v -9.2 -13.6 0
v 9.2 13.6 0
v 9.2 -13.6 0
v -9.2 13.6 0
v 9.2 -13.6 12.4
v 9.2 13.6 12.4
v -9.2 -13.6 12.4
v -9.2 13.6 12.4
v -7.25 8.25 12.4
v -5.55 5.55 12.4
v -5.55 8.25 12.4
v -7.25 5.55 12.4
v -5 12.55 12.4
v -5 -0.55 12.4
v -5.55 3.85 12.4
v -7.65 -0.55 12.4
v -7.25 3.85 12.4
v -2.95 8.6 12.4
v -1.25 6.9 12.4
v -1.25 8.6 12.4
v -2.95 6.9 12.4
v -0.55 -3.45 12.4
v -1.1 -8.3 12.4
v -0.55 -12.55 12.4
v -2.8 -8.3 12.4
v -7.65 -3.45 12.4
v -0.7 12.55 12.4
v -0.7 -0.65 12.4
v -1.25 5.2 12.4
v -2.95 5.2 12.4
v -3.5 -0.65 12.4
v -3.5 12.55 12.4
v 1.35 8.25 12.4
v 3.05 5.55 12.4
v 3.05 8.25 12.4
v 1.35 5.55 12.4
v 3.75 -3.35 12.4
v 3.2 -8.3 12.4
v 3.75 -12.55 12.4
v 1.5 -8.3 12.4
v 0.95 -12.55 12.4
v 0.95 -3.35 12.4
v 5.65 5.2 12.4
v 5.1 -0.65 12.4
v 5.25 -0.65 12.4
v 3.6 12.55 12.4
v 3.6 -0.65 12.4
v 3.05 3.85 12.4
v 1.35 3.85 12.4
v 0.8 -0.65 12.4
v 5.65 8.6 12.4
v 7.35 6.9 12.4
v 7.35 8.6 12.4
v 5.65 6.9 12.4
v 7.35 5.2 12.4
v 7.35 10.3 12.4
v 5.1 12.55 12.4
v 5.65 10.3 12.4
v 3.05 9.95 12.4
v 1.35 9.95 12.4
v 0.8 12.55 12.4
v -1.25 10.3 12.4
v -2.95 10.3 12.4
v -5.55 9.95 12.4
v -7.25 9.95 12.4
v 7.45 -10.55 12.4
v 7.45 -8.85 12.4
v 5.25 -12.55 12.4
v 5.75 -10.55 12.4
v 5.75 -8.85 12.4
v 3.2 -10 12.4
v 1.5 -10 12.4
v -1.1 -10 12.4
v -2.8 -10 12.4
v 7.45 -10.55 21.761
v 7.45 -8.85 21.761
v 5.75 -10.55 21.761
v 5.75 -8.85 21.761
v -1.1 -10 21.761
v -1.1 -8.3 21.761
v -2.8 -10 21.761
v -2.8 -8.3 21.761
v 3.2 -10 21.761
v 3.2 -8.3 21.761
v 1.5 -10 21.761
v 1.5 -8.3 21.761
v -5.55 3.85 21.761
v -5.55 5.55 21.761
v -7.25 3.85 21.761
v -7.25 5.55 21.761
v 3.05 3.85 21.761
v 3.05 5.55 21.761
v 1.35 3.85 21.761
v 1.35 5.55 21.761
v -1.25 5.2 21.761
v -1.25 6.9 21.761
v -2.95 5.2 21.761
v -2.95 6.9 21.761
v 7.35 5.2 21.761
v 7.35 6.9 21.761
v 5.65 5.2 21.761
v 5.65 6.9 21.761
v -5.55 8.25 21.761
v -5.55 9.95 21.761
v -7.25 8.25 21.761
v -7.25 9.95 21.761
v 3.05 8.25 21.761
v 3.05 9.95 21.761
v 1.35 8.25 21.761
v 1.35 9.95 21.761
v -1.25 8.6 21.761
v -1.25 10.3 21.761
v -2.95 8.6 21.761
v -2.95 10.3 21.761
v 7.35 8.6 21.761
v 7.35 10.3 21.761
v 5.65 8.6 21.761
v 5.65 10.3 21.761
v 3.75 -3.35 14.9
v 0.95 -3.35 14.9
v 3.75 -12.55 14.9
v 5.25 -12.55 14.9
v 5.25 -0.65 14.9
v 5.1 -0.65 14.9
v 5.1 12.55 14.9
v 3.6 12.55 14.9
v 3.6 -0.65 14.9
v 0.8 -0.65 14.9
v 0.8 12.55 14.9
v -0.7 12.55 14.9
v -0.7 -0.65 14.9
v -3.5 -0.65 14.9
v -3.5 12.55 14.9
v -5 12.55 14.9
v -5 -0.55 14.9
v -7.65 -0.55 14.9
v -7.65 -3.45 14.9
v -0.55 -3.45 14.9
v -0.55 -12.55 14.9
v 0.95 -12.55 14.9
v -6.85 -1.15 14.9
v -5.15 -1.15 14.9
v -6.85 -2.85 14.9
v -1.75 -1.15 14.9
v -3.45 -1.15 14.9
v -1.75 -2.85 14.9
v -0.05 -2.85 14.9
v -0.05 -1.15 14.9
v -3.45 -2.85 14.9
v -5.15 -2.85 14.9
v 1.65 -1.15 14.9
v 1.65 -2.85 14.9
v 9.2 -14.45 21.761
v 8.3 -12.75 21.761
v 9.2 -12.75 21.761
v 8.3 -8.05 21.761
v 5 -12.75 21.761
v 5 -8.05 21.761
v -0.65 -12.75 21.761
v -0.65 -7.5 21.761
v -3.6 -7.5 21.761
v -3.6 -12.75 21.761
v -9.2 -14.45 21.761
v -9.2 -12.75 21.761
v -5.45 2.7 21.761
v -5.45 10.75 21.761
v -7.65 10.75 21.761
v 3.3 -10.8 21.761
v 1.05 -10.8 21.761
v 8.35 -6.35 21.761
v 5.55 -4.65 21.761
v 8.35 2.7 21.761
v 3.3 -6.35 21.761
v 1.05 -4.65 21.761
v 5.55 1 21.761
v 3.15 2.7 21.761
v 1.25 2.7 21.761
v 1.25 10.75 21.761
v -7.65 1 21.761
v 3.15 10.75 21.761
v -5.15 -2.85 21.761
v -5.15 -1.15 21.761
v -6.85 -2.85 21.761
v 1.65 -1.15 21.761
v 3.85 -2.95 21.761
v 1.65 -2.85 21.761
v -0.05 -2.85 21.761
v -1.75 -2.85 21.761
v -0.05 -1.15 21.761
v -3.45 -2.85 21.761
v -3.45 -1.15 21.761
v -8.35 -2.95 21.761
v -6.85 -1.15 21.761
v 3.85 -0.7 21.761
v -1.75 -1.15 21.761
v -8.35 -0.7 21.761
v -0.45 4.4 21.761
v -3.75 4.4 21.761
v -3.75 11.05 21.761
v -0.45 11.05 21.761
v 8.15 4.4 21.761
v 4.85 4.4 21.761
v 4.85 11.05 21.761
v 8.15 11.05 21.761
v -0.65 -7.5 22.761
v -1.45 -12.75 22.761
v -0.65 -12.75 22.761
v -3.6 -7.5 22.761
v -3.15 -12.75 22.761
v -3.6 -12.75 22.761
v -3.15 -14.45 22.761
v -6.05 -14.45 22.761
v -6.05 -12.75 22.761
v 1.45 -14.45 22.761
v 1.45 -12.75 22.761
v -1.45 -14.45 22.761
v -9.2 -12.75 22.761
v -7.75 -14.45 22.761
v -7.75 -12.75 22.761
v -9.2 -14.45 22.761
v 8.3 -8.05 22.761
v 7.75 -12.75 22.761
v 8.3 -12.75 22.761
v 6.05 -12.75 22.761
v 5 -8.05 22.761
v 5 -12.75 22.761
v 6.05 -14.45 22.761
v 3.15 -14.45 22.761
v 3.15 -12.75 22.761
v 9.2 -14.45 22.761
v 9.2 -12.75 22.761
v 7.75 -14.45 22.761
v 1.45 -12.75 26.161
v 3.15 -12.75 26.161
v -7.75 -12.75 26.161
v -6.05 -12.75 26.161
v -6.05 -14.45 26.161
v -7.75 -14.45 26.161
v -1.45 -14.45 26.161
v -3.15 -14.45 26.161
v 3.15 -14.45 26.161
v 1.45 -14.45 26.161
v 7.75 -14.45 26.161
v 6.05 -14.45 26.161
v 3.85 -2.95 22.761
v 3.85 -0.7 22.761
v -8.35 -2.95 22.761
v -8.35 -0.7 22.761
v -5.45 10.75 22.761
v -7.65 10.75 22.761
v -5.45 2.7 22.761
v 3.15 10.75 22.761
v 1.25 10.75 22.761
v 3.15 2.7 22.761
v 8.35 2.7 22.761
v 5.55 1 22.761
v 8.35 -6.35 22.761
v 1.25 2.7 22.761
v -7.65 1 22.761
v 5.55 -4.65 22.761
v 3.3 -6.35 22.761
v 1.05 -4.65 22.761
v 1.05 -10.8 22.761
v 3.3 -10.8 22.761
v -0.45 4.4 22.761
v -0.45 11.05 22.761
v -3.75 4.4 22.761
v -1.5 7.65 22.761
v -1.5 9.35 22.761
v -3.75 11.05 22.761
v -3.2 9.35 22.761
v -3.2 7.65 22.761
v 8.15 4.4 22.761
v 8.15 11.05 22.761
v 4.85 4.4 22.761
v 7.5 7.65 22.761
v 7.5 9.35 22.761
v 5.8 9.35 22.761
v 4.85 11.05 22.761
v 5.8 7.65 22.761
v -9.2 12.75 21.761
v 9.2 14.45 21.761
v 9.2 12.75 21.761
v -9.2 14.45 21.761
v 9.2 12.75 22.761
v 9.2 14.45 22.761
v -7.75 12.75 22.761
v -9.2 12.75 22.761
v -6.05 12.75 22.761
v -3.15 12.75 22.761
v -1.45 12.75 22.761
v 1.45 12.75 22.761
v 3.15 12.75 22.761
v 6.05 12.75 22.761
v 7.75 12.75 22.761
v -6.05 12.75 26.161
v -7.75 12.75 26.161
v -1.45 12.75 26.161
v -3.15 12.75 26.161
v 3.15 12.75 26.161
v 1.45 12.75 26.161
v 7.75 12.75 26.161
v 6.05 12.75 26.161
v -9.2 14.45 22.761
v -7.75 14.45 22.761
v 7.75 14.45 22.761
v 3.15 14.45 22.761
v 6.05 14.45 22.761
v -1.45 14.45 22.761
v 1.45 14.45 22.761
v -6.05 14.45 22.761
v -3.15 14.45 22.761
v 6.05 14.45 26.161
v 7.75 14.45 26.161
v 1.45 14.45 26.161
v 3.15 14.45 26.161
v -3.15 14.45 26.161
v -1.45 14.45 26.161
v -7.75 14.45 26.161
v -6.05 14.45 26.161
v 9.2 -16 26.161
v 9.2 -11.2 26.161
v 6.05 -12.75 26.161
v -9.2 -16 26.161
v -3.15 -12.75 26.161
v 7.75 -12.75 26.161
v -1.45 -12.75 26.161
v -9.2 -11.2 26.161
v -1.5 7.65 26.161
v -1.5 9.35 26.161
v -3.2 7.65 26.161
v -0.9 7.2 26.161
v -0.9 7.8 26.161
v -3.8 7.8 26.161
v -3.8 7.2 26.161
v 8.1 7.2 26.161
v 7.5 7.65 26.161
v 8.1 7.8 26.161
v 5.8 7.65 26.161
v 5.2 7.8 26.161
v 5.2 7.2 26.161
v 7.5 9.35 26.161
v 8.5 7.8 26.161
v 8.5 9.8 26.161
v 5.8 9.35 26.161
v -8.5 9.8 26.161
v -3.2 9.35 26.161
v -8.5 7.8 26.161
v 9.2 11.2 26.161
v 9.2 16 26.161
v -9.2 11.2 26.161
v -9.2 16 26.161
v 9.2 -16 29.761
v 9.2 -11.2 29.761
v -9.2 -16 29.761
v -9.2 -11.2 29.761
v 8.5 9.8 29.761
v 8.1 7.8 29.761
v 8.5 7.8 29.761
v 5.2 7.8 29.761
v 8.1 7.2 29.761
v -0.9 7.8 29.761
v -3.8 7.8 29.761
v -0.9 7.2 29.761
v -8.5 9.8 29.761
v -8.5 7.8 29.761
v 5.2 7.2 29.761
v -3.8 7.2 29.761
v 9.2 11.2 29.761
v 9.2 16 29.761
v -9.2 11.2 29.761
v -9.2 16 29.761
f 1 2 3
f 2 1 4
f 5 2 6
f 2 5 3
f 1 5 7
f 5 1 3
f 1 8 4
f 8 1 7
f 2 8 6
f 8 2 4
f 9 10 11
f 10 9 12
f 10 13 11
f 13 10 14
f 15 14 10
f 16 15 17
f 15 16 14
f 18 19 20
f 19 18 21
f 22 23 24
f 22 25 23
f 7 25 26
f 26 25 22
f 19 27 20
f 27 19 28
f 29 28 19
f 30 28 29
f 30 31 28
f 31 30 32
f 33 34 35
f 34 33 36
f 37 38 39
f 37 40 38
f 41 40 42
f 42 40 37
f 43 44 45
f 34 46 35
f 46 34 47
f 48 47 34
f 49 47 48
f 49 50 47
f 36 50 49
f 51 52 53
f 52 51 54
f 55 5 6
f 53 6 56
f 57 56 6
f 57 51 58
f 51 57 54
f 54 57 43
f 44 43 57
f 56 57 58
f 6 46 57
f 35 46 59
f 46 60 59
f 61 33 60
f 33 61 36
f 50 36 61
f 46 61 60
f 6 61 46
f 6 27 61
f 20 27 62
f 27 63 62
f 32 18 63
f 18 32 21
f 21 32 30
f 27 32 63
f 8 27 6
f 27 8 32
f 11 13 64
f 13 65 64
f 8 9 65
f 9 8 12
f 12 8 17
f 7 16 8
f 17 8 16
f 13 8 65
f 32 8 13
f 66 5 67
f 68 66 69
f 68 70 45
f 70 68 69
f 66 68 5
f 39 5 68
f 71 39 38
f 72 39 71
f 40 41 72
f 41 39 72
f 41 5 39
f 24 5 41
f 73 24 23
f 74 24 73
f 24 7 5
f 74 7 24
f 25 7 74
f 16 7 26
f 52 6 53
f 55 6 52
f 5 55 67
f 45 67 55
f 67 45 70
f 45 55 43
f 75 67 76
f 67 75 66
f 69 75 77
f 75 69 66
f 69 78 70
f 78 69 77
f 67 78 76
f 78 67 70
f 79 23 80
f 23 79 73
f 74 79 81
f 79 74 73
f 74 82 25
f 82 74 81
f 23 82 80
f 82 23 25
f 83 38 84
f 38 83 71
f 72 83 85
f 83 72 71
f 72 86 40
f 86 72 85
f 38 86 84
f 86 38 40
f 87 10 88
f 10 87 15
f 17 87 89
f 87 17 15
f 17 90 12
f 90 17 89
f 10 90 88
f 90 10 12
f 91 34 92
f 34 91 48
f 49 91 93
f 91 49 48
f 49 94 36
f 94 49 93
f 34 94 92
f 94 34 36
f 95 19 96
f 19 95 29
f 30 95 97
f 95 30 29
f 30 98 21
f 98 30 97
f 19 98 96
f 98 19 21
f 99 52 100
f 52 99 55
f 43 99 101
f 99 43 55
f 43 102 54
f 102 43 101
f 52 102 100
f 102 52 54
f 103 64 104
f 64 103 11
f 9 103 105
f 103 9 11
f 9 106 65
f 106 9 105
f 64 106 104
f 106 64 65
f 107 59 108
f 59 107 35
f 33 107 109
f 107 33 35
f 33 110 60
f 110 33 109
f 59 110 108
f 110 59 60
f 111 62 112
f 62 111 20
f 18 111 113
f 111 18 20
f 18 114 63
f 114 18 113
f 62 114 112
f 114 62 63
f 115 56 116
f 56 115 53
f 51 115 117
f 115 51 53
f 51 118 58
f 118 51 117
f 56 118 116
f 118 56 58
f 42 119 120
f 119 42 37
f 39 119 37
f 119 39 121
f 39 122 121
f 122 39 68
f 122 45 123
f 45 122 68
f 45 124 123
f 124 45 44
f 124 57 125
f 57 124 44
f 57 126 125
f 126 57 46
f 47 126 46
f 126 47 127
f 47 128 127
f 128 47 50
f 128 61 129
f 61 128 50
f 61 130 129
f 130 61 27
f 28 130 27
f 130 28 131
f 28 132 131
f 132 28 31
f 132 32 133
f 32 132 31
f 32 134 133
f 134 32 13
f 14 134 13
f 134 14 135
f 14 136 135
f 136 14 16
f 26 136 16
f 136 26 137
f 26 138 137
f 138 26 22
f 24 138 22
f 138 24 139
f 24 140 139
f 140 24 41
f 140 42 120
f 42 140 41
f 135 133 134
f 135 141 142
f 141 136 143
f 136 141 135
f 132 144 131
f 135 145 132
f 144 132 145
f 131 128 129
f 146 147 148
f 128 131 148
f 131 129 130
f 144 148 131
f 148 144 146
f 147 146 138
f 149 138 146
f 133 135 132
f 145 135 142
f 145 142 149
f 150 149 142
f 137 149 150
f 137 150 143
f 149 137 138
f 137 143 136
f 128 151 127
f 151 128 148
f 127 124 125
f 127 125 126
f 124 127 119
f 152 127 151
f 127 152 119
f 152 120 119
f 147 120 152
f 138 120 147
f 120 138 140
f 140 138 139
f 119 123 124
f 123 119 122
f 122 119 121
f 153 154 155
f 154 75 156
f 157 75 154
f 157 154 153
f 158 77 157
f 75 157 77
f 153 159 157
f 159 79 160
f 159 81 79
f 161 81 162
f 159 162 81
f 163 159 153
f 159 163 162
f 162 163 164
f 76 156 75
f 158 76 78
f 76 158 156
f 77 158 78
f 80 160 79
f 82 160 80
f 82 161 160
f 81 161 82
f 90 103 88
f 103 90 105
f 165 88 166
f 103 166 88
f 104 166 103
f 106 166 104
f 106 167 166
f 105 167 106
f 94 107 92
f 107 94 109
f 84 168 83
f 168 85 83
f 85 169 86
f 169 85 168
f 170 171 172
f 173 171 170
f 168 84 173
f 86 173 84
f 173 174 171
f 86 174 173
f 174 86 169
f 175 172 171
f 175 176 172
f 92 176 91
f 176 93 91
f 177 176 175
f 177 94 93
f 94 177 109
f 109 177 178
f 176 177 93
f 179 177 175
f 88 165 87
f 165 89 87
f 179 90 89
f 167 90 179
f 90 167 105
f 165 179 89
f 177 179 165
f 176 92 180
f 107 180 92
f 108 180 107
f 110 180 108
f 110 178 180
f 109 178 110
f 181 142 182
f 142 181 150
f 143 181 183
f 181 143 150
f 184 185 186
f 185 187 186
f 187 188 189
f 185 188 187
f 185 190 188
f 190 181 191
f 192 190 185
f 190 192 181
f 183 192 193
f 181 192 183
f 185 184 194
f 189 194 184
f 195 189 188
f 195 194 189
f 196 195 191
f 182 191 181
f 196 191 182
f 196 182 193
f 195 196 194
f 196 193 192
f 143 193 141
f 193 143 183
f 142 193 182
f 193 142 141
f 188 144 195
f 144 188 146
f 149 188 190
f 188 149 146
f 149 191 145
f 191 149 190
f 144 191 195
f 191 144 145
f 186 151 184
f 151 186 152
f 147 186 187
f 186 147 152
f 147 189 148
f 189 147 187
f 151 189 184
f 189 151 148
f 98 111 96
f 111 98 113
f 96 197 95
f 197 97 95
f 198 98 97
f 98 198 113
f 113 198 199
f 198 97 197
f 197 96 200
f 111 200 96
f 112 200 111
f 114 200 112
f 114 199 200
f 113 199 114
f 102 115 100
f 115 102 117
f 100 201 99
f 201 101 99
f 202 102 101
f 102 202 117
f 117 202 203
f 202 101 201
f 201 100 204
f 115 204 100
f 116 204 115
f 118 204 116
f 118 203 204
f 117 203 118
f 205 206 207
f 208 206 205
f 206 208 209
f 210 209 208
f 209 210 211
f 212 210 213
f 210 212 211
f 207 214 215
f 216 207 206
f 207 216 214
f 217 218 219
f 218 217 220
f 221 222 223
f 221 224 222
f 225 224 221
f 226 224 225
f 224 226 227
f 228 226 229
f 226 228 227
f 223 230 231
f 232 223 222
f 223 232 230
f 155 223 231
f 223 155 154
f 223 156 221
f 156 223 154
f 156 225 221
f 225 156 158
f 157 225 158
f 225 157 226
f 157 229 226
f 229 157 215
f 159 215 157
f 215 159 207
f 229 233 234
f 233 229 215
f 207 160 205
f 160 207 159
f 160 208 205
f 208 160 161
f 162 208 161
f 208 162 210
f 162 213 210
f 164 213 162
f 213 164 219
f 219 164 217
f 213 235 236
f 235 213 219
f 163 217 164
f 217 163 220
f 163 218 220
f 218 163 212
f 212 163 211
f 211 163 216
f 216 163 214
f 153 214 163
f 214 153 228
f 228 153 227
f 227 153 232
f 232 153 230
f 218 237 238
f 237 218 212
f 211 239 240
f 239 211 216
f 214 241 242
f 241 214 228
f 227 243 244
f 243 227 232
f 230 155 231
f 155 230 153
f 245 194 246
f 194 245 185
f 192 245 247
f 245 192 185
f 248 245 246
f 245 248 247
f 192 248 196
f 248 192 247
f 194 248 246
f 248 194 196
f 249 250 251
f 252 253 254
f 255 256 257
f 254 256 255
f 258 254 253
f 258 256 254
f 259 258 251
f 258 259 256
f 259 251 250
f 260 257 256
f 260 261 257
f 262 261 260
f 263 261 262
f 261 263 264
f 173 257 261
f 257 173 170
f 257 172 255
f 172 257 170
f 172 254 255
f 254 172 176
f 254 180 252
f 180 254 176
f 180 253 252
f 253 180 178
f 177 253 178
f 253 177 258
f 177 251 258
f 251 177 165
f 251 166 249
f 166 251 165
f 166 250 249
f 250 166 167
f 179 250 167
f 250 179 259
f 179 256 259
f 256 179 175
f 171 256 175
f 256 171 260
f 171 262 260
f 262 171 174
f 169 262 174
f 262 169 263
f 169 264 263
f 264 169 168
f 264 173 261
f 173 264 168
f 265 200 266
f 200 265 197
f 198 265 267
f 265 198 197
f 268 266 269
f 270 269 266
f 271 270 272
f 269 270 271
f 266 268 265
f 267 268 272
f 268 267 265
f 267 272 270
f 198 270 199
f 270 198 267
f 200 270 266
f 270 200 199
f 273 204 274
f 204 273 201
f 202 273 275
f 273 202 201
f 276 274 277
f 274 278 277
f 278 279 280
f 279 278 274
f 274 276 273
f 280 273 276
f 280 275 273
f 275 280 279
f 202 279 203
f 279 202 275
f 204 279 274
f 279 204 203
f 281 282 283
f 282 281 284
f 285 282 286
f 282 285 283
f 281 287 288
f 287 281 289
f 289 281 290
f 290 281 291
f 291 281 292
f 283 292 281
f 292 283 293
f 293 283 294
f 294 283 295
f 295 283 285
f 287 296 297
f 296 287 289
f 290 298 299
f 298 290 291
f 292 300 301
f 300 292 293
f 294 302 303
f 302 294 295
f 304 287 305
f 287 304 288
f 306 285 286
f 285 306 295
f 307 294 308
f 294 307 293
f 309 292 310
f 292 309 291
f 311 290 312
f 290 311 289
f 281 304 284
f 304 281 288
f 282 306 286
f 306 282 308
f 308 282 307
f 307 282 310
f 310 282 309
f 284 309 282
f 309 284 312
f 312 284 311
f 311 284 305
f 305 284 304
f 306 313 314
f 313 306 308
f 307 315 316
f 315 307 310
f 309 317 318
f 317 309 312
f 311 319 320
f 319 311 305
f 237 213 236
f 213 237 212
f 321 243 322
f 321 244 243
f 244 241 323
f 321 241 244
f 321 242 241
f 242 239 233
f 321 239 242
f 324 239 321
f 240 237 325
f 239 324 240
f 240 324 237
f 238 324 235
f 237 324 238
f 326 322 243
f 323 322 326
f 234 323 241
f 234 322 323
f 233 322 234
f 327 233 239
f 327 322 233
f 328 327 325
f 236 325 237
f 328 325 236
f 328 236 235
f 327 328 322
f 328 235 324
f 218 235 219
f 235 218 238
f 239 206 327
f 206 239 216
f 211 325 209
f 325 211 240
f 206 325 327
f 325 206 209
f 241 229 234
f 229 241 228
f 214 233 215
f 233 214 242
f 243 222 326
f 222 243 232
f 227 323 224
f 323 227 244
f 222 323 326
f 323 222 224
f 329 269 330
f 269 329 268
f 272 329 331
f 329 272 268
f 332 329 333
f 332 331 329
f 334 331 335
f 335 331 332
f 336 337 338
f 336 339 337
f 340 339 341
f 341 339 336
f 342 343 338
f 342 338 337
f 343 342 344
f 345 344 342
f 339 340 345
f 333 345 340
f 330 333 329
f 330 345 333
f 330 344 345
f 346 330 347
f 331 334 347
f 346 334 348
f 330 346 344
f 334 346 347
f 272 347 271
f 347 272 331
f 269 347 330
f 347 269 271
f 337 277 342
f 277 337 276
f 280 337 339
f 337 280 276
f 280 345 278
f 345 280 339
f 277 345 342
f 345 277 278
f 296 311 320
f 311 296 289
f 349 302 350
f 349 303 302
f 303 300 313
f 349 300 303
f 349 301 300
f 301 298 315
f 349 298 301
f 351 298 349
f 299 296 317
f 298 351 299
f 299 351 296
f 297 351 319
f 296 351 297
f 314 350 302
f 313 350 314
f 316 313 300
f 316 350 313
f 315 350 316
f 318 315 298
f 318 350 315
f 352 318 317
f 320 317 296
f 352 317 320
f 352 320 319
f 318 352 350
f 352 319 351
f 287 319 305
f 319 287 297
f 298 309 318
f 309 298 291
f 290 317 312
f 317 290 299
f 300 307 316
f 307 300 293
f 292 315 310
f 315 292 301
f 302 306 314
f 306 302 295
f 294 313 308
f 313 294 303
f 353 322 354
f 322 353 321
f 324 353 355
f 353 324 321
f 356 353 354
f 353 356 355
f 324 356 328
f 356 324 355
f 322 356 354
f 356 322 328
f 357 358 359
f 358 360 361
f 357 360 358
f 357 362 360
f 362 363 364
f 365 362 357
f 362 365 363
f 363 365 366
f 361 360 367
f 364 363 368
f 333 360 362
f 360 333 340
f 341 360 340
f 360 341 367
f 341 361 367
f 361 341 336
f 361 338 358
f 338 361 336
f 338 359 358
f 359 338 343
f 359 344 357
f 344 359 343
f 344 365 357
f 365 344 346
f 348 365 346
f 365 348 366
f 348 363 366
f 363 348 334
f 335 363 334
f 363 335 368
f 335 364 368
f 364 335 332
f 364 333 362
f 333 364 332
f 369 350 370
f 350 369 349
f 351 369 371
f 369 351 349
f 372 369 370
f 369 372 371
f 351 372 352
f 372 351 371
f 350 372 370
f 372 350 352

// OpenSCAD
// Generated by SolidPython 0.4.2 on 2020-09-29 23:21:03
//!OpenSCAD

scale(v = 0.0100000000) {
	translate(v = [-920, -1360, 0]) {
		union() {
			color(c = [0.4000000000, 0.4000000000, 0.4000000000]) {
				translate(v = [0, 0, 0]) {
					linear_extrude(height = 1000.0000000000) {
						polygon(paths = [[0, 1, 2, 3]], points = [[0, 0], [0, 2720], [1840, 2720], [1840, 0]]);
					}
				}
			}
			color(c = [0.2000000000, 0.6000000000, 0.2000000000]) {
				translate(v = [0, 0, 1000.0000000000]) {
					linear_extrude(height = 120.0000000000) {
						polygon(paths = [[0, 1, 2, 3]], points = [[0, 1305], [0, 2720], [1840, 2720], [1840, 1305]]);
					}
				}
			}
			color(c = [0.4000000000, 0.4000000000, 0.4000000000]) {
				translate(v = [0, 0, 1000.0000000000]) {
					linear_extrude(height = 120.0000000000) {
						polygon(paths = [[0, 1, 2, 3]], points = [[0, 0], [0, 1305], [1840, 1305], [1840, 0]]);
					}
				}
			}
			color(c = [0.9000000000, 0.6000000000, 0.6000000000]) {
				translate(v = [0, 0, 1120.0000000000]) {
					linear_extrude(height = 120.0000000000) {
						polygon(paths = [[0, 1, 2, 3]], points = [[155, 1485], [155, 2485], [420, 2485], [420, 1485]]);
					}
				}
			}
			color(c = [0.9000000000, 0.6000000000, 0.6000000000]) {
				translate(v = [0, 0, 1120.0000000000]) {
					linear_extrude(height = 120.0000000000) {
						polygon(paths = [[0, 1, 2, 3]], points = [[570, 1485], [570, 2485], [850, 2485], [850, 1485]]);
					}
				}
			}
			color(c = [0.9000000000, 0.6000000000, 0.6000000000]) {
				translate(v = [0, 0, 1120.0000000000]) {
					linear_extrude(height = 120.0000000000) {
						polygon(paths = [[0, 1, 2, 3]], points = [[1000, 1485], [1000, 2485], [1280, 2485], [1280, 1485]]);
					}
				}
			}
			color(c = [0.9000000000, 0.6000000000, 0.6000000000]) {
				translate(v = [0, 0, 1120.0000000000]) {
					linear_extrude(height = 120.0000000000) {
						polygon(paths = [[0, 1, 2, 3]], points = [[1430, 1485], [1430, 2485], [1695, 2485], [1695, 1485]]);
					}
				}
			}
			color(c = [0.9000000000, 0.6000000000, 0.9000000000]) {
				translate(v = [0, 0, 1120.0000000000]) {
					linear_extrude(height = 120.0000000000) {
						polygon(paths = [[0, 1, 2, 3]], points = [[600, 235], [600, 655], [865, 655], [865, 235]]);
					}
				}
			}
			color(c = [0.9000000000, 0.6000000000, 0.9000000000]) {
				translate(v = [0, 0, 1120.0000000000]) {
					linear_extrude(height = 120.0000000000) {
						polygon(paths = [[0, 1, 2, 3]], points = [[1015, 235], [1015, 655], [1295, 655], [1295, 235]]);
					}
				}
			}
			color(c = [0.9000000000, 0.6000000000, 0.9000000000]) {
				translate(v = [0, 0, 1120.0000000000]) {
					linear_extrude(height = 120.0000000000) {
						polygon(paths = [[0, 1, 2, 3]], points = [[1445, 235], [1445, 655], [1705, 655], [1705, 235]]);
					}
				}
			}
			color(c = [0.2000000000, 0.6000000000, 0.2000000000]) {
				translate(v = [0, 0, 1120.0000000000]) {
					linear_extrude(height = 120.0000000000) {
						difference() {
							polygon(paths = [[0, 1, 2, 3]], points = [[0, 1305], [0, 2720], [1840, 2720], [1840, 1305]]);
							polygon(paths = [[0, 1, 2, 3]], points = [[155, 1485], [420, 1485], [420, 2485], [155, 2485]]);
							polygon(paths = [[0, 1, 2, 3]], points = [[570, 1485], [850, 1485], [850, 2485], [570, 2485]]);
							polygon(paths = [[0, 1, 2, 3]], points = [[1000, 1485], [1280, 1485], [1280, 2485], [1000, 2485]]);
							polygon(paths = [[0, 1, 2, 3]], points = [[1430, 1485], [1695, 1485], [1695, 2485], [1430, 2485]]);
						}
					}
				}
			}
			color(c = [0.4000000000, 0.4000000000, 0.4000000000]) {
				translate(v = [0, 0, 1120.0000000000]) {
					linear_extrude(height = 120.0000000000) {
						difference() {
							polygon(paths = [[0, 1, 2, 3]], points = [[0, 0], [0, 1305], [1840, 1305], [1840, 0]]);
							polygon(paths = [[0, 1, 2, 3]], points = [[600, 235], [865, 235], [865, 655], [600, 655]]);
							polygon(paths = [[0, 1, 2, 3]], points = [[1015, 235], [1295, 235], [1295, 655], [1015, 655]]);
							polygon(paths = [[0, 1, 2, 3]], points = [[1445, 235], [1705, 235], [1705, 655], [1445, 655]]);
						}
					}
				}
			}
			color(c = [0.1000000000, 0.1000000000, 0.1000000000]) {
				translate(v = [0, 0, 1240.0000000000]) {
					linear_extrude(height = 70.0000000000) {
						polygon(paths = [[0, 1, 2, 3]], points = [[1495, 305], [1495, 475], [1665, 475], [1665, 305]]);
					}
				}
			}
			color(c = [0.1000000000, 0.1000000000, 0.1000000000]) {
				translate(v = [0, 0, 1240.0000000000]) {
					linear_extrude(height = 70.0000000000) {
						polygon(paths = [[0, 1, 2, 3]], points = [[640, 360], [640, 530], [810, 530], [810, 360]]);
					}
				}
			}
			color(c = [0.1000000000, 0.1000000000, 0.1000000000]) {
				translate(v = [0, 0, 1240.0000000000]) {
					linear_extrude(height = 70.0000000000) {
						polygon(paths = [[0, 1, 2, 3]], points = [[1070, 360], [1070, 530], [1240, 530], [1240, 360]]);
					}
				}
			}
			color(c = [0.1000000000, 0.1000000000, 0.1000000000]) {
				translate(v = [0, 0, 1240.0000000000]) {
					linear_extrude(height = 70.0000000000) {
						polygon(paths = [[0, 1, 2, 3]], points = [[195, 1745], [195, 1915], [365, 1915], [365, 1745]]);
					}
				}
			}
			color(c = [0.1000000000, 0.1000000000, 0.1000000000]) {
				translate(v = [0, 0, 1240.0000000000]) {
					linear_extrude(height = 70.0000000000) {
						polygon(paths = [[0, 1, 2, 3]], points = [[1055, 1745], [1055, 1915], [1225, 1915], [1225, 1745]]);
					}
				}
			}
			color(c = [0.1000000000, 0.1000000000, 0.1000000000]) {
				translate(v = [0, 0, 1240.0000000000]) {
					linear_extrude(height = 70.0000000000) {
						polygon(paths = [[0, 1, 2, 3]], points = [[625, 1880], [625, 2050], [795, 2050], [795, 1880]]);
					}
				}
			}
			color(c = [0.1000000000, 0.1000000000, 0.1000000000]) {
				translate(v = [0, 0, 1240.0000000000]) {
					linear_extrude(height = 70.0000000000) {
						polygon(paths = [[0, 1, 2, 3]], points = [[1485, 1880], [1485, 2050], [1655, 2050], [1655, 1880]]);
					}
				}
			}
			color(c = [0.1000000000, 0.1000000000, 0.1000000000]) {
				translate(v = [0, 0, 1240.0000000000]) {
					linear_extrude(height = 70.0000000000) {
						polygon(paths = [[0, 1, 2, 3]], points = [[195, 2185], [195, 2355], [365, 2355], [365, 2185]]);
					}
				}
			}
			color(c = [0.1000000000, 0.1000000000, 0.1000000000]) {
				translate(v = [0, 0, 1240.0000000000]) {
					linear_extrude(height = 70.0000000000) {
						polygon(paths = [[0, 1, 2, 3]], points = [[1055, 2185], [1055, 2355], [1225, 2355], [1225, 2185]]);
					}
				}
			}
			color(c = [0.1000000000, 0.1000000000, 0.1000000000]) {
				translate(v = [0, 0, 1240.0000000000]) {
					linear_extrude(height = 70.0000000000) {
						polygon(paths = [[0, 1, 2, 3]], points = [[625, 2220], [625, 2390], [795, 2390], [795, 2220]]);
					}
				}
			}
			color(c = [0.1000000000, 0.1000000000, 0.1000000000]) {
				translate(v = [0, 0, 1240.0000000000]) {
					linear_extrude(height = 70.0000000000) {
						polygon(paths = [[0, 1, 2, 3]], points = [[1485, 2220], [1485, 2390], [1655, 2390], [1655, 2220]]);
					}
				}
			}
			color(c = [1.0000000000, 1.0000000000, 1.0000000000]) {
				translate(v = [0, 0, 1240.0000000000]) {
					linear_extrude(height = 70.0000000000) {
						polygon(paths = [[0, 1, 2, 3, 4, 5, 6, 7, 8, 9, 10, 11, 12, 13, 14, 15, 16, 17, 18, 19, 20, 21]], points = [[865, 105], [865, 1015], [155, 1015], [155, 1305], [420, 1305], [420, 2615], [570, 2615], [570, 1295], [850, 1295], [850, 2615], [1000, 2615], [1000, 1295], [1280, 1295], [1280, 2615], [1430, 2615], [1430, 1295], [1445, 1295], [1445, 105], [1295, 105], [1295, 1025], [1015, 1025], [1015, 105]]);
					}
				}
			}
			color(c = [0.1000000000, 0.1000000000, 0.1000000000]) {
				translate(v = [0, 0, 1310.0000000000]) {
					linear_extrude(height = 180.0000000000) {
						polygon(paths = [[0, 1, 2, 3]], points = [[1495, 305], [1495, 475], [1665, 475], [1665, 305]]);
					}
				}
			}
			color(c = [0.1000000000, 0.1000000000, 0.1000000000]) {
				translate(v = [0, 0, 1310.0000000000]) {
					linear_extrude(height = 180.0000000000) {
						polygon(paths = [[0, 1, 2, 3]], points = [[640, 360], [640, 530], [810, 530], [810, 360]]);
					}
				}
			}
			color(c = [0.1000000000, 0.1000000000, 0.1000000000]) {
				translate(v = [0, 0, 1310.0000000000]) {
					linear_extrude(height = 180.0000000000) {
						polygon(paths = [[0, 1, 2, 3]], points = [[1070, 360], [1070, 530], [1240, 530], [1240, 360]]);
					}
				}
			}
			color(c = [0.1000000000, 0.1000000000, 0.1000000000]) {
				translate(v = [0, 0, 1310.0000000000]) {
					linear_extrude(height = 180.0000000000) {
						polygon(paths = [[0, 1, 2, 3]], points = [[195, 1745], [195, 1915], [365, 1915], [365, 1745]]);
					}
				}
			}
			color(c = [0.1000000000, 0.1000000000, 0.1000000000]) {
				translate(v = [0, 0, 1310.0000000000]) {
					linear_extrude(height = 180.0000000000) {
						polygon(paths = [[0, 1, 2, 3]], points = [[1055, 1745], [1055, 1915], [1225, 1915], [1225, 1745]]);
					}
				}
			}
			color(c = [0.1000000000, 0.1000000000, 0.1000000000]) {
				translate(v = [0, 0, 1310.0000000000]) {
					linear_extrude(height = 180.0000000000) {
						polygon(paths = [[0, 1, 2, 3]], points = [[625, 1880], [625, 2050], [795, 2050], [795, 1880]]);
					}
				}
			}
			color(c = [0.1000000000, 0.1000000000, 0.1000000000]) {
				translate(v = [0, 0, 1310.0000000000]) {
					linear_extrude(height = 180.0000000000) {
						polygon(paths = [[0, 1, 2, 3]], points = [[1485, 1880], [1485, 2050], [1655, 2050], [1655, 1880]]);
					}
				}
			}
			color(c = [0.1000000000, 0.1000000000, 0.1000000000]) {
				translate(v = [0, 0, 1310.0000000000]) {
					linear_extrude(height = 180.0000000000) {
						polygon(paths = [[0, 1, 2, 3]], points = [[195, 2185], [195, 2355], [365, 2355], [365, 2185]]);
					}
				}
			}
			color(c = [0.1000000000, 0.1000000000, 0.1000000000]) {
				translate(v = [0, 0, 1310.0000000000]) {
					linear_extrude(height = 180.0000000000) {
						polygon(paths = [[0, 1, 2, 3]], points = [[1055, 2185], [1055, 2355], [1225, 2355], [1225, 2185]]);
					}
				}
			}
			color(c = [0.1000000000, 0.1000000000, 0.1000000000]) {
				translate(v = [0, 0, 1310.0000000000]) {
					linear_extrude(height = 180.0000000000) {
						polygon(paths = [[0, 1, 2, 3]], points = [[625, 2220], [625, 2390], [795, 2390], [795, 2220]]);
					}
				}
			}
			color(c = [0.1000000000, 0.1000000000, 0.1000000000]) {
				translate(v = [0, 0, 1310.0000000000]) {
					linear_extrude(height = 180.0000000000) {
						polygon(paths = [[0, 1, 2, 3]], points = [[1485, 2220], [1485, 2390], [1655, 2390], [1655, 2220]]);
					}
				}
			}
			color(c = [0.7000000000, 0, 0]) {
				translate(v = [0, 0, 1310.0000000000]) {
					linear_extrude(height = 180.0000000000) {
						polygon(paths = [[0, 1, 2, 3, 4, 5, 6, 7, 8, 9, 10, 11, 12, 13, 14, 15, 16, 17, 18, 19, 20, 21]], points = [[865, 105], [865, 1015], [155, 1015], [155, 1305], [420, 1305], [420, 2615], [570, 2615], [570, 1295], [850, 1295], [850, 2615], [1000, 2615], [1000, 1295], [1280, 1295], [1280, 2615], [1430, 2615], [1430, 1295], [1445, 1295], [1445, 105], [1295, 105], [1295, 1025], [1015, 1025], [1015, 105]]);
					}
				}
			}
			color(c = [0.1000000000, 0.1000000000, 0.1000000000]) {
				translate(v = [0, 0, 1490.0000000000]) {
					linear_extrude(height = 686.1000000000) {
						polygon(paths = [[0, 1, 2, 3]], points = [[1495, 305], [1495, 475], [1665, 475], [1665, 305]]);
					}
				}
			}
			color(c = [0.1000000000, 0.1000000000, 0.1000000000]) {
				translate(v = [0, 0, 1490.0000000000]) {
					linear_extrude(height = 686.1000000000) {
						polygon(paths = [[0, 1, 2, 3]], points = [[640, 360], [640, 530], [810, 530], [810, 360]]);
					}
				}
			}
			color(c = [0.1000000000, 0.1000000000, 0.1000000000]) {
				translate(v = [0, 0, 1490.0000000000]) {
					linear_extrude(height = 686.1000000000) {
						polygon(paths = [[0, 1, 2, 3]], points = [[1070, 360], [1070, 530], [1240, 530], [1240, 360]]);
					}
				}
			}
			color(c = [0.1000000000, 0.1000000000, 0.1000000000]) {
				translate(v = [0, 0, 1490.0000000000]) {
					linear_extrude(height = 686.1000000000) {
						polygon(paths = [[0, 1, 2, 3]], points = [[235, 1075], [235, 1245], [405, 1245], [405, 1075]]);
					}
				}
			}
			color(c = [0.1000000000, 0.1000000000, 0.1000000000]) {
				translate(v = [0, 0, 1490.0000000000]) {
					linear_extrude(height = 686.1000000000) {
						polygon(paths = [[0, 1, 2, 3]], points = [[575, 1075], [575, 1245], [745, 1245], [745, 1075]]);
					}
				}
			}
			color(c = [0.1000000000, 0.1000000000, 0.1000000000]) {
				translate(v = [0, 0, 1490.0000000000]) {
					linear_extrude(height = 686.1000000000) {
						polygon(paths = [[0, 1, 2, 3]], points = [[915, 1075], [915, 1245], [1085, 1245], [1085, 1075]]);
					}
				}
			}
			color(c = [0.1000000000, 0.1000000000, 0.1000000000]) {
				translate(v = [0, 0, 1490.0000000000]) {
					linear_extrude(height = 686.1000000000) {
						polygon(paths = [[0, 1, 2, 3]], points = [[195, 1745], [195, 1915], [365, 1915], [365, 1745]]);
					}
				}
			}
			color(c = [0.1000000000, 0.1000000000, 0.1000000000]) {
				translate(v = [0, 0, 1490.0000000000]) {
					linear_extrude(height = 686.1000000000) {
						polygon(paths = [[0, 1, 2, 3]], points = [[1055, 1745], [1055, 1915], [1225, 1915], [1225, 1745]]);
					}
				}
			}
			color(c = [0.1000000000, 0.1000000000, 0.1000000000]) {
				translate(v = [0, 0, 1490.0000000000]) {
					linear_extrude(height = 686.1000000000) {
						polygon(paths = [[0, 1, 2, 3]], points = [[625, 1880], [625, 2050], [795, 2050], [795, 1880]]);
					}
				}
			}
			color(c = [0.1000000000, 0.1000000000, 0.1000000000]) {
				translate(v = [0, 0, 1490.0000000000]) {
					linear_extrude(height = 686.1000000000) {
						polygon(paths = [[0, 1, 2, 3]], points = [[1485, 1880], [1485, 2050], [1655, 2050], [1655, 1880]]);
					}
				}
			}
			color(c = [0.1000000000, 0.1000000000, 0.1000000000]) {
				translate(v = [0, 0, 1490.0000000000]) {
					linear_extrude(height = 686.1000000000) {
						polygon(paths = [[0, 1, 2, 3]], points = [[195, 2185], [195, 2355], [365, 2355], [365, 2185]]);
					}
				}
			}
			color(c = [0.1000000000, 0.1000000000, 0.1000000000]) {
				translate(v = [0, 0, 1490.0000000000]) {
					linear_extrude(height = 686.1000000000) {
						polygon(paths = [[0, 1, 2, 3]], points = [[1055, 2185], [1055, 2355], [1225, 2355], [1225, 2185]]);
					}
				}
			}
			color(c = [0.1000000000, 0.1000000000, 0.1000000000]) {
				translate(v = [0, 0, 1490.0000000000]) {
					linear_extrude(height = 686.1000000000) {
						polygon(paths = [[0, 1, 2, 3]], points = [[625, 2220], [625, 2390], [795, 2390], [795, 2220]]);
					}
				}
			}
			color(c = [0.1000000000, 0.1000000000, 0.1000000000]) {
				translate(v = [0, 0, 1490.0000000000]) {
					linear_extrude(height = 686.1000000000) {
						polygon(paths = [[0, 1, 2, 3]], points = [[1485, 2220], [1485, 2390], [1655, 2390], [1655, 2220]]);
					}
				}
			}
			color(c = [0.9000000000, 0.6000000000, 0.6000000000]) {
				translate(v = [0, 0, 2176.1000000000]) {
					linear_extrude(height = 100.0000000000) {
						polygon(paths = [[0, 1, 2, 3, 4, 5, 6, 7, 8, 9, 10, 11]], points = [[0, -85], [0, 85], [560, 85], [560, 610], [855, 610], [855, 85], [1420, 85], [1420, 555], [1750, 555], [1750, 85], [1840, 85], [1840, -85]]);
					}
				}
			}
			color(c = [0.9000000000, 0.6000000000, 0.6000000000]) {
				translate(v = [0, 0, 2176.1000000000]) {
					linear_extrude(height = 100.0000000000) {
						polygon(paths = [[0, 1, 2, 3]], points = [[85, 1065], [85, 1290], [1305, 1290], [1305, 1065]]);
					}
				}
			}
			color(c = [0.9000000000, 0.6000000000, 0.6000000000]) {
				translate(v = [0, 0, 2176.1000000000]) {
					linear_extrude(height = 100.0000000000) {
						polygon(paths = [[0, 1, 2, 3, 4, 5, 6, 7, 8, 9, 10, 11, 12, 13, 14, 15]], points = [[1025, 280], [1025, 895], [1475, 895], [1475, 1460], [155, 1460], [155, 2435], [375, 2435], [375, 1630], [1045, 1630], [1045, 2435], [1235, 2435], [1235, 1630], [1755, 1630], [1755, 725], [1250, 725], [1250, 280]]);
					}
				}
			}
			color(c = [0.9000000000, 0.6000000000, 0.6000000000]) {
				translate(v = [0, 0, 2176.1000000000]) {
					linear_extrude(height = 100.0000000000) {
						polygon(paths = [[0, 1, 2, 3]], points = [[545, 1800], [545, 2465], [875, 2465], [875, 1800]]);
					}
				}
			}
			color(c = [0.9000000000, 0.6000000000, 0.6000000000]) {
				translate(v = [0, 0, 2176.1000000000]) {
					linear_extrude(height = 100.0000000000) {
						polygon(paths = [[0, 1, 2, 3]], points = [[1405, 1800], [1405, 2465], [1735, 2465], [1735, 1800]]);
					}
				}
			}
			color(c = [0.9000000000, 0.6000000000, 0.6000000000]) {
				translate(v = [0, 0, 2176.1000000000]) {
					linear_extrude(height = 100.0000000000) {
						polygon(paths = [[0, 1, 2, 3]], points = [[0, 2635], [0, 2805], [1840, 2805], [1840, 2635]]);
					}
				}
			}
			color(c = [0.5000000000, 0.5000000000, 0.5000000000]) {
				translate(v = [0, 0, 2276.1000000000]) {
					linear_extrude(height = 340.0000000000) {
						polygon(paths = [[0, 1, 2, 3]], points = [[145, -85], [145, 85], [315, 85], [315, -85]]);
					}
				}
			}
			color(c = [0.5000000000, 0.5000000000, 0.5000000000]) {
				translate(v = [0, 0, 2276.1000000000]) {
					linear_extrude(height = 340.0000000000) {
						polygon(paths = [[0, 1, 2, 3]], points = [[605, -85], [605, 85], [775, 85], [775, -85]]);
					}
				}
			}
			color(c = [0.5000000000, 0.5000000000, 0.5000000000]) {
				translate(v = [0, 0, 2276.1000000000]) {
					linear_extrude(height = 340.0000000000) {
						polygon(paths = [[0, 1, 2, 3]], points = [[1065, -85], [1065, 85], [1235, 85], [1235, -85]]);
					}
				}
			}
			color(c = [0.5000000000, 0.5000000000, 0.5000000000]) {
				translate(v = [0, 0, 2276.1000000000]) {
					linear_extrude(height = 340.0000000000) {
						polygon(paths = [[0, 1, 2, 3]], points = [[1525, -85], [1525, 85], [1695, 85], [1695, -85]]);
					}
				}
			}
			color(c = [0.5000000000, 0.5000000000, 0.5000000000]) {
				translate(v = [0, 0, 2276.1000000000]) {
					linear_extrude(height = 340.0000000000) {
						polygon(paths = [[0, 1, 2, 3]], points = [[600, 2125], [600, 2295], [770, 2295], [770, 2125]]);
					}
				}
			}
			color(c = [0.5000000000, 0.5000000000, 0.5000000000]) {
				translate(v = [0, 0, 2276.1000000000]) {
					linear_extrude(height = 340.0000000000) {
						polygon(paths = [[0, 1, 2, 3]], points = [[1500, 2125], [1500, 2295], [1670, 2295], [1670, 2125]]);
					}
				}
			}
			color(c = [0.5000000000, 0.5000000000, 0.5000000000]) {
				translate(v = [0, 0, 2276.1000000000]) {
					linear_extrude(height = 340.0000000000) {
						polygon(paths = [[0, 1, 2, 3]], points = [[145, 2635], [145, 2805], [315, 2805], [315, 2635]]);
					}
				}
			}
			color(c = [0.5000000000, 0.5000000000, 0.5000000000]) {
				translate(v = [0, 0, 2276.1000000000]) {
					linear_extrude(height = 340.0000000000) {
						polygon(paths = [[0, 1, 2, 3]], points = [[605, 2635], [605, 2805], [775, 2805], [775, 2635]]);
					}
				}
			}
			color(c = [0.5000000000, 0.5000000000, 0.5000000000]) {
				translate(v = [0, 0, 2276.1000000000]) {
					linear_extrude(height = 340.0000000000) {
						polygon(paths = [[0, 1, 2, 3]], points = [[1065, 2635], [1065, 2805], [1235, 2805], [1235, 2635]]);
					}
				}
			}
			color(c = [0.5000000000, 0.5000000000, 0.5000000000]) {
				translate(v = [0, 0, 2276.1000000000]) {
					linear_extrude(height = 340.0000000000) {
						polygon(paths = [[0, 1, 2, 3]], points = [[1525, 2635], [1525, 2805], [1695, 2805], [1695, 2635]]);
					}
				}
			}
			color(c = [0.3000000000, 0.3000000000, 1]) {
				translate(v = [0, 0, 2616.1000000000]) {
					linear_extrude(height = 360.0000000000) {
						polygon(paths = [[0, 1, 2, 3]], points = [[0, -240], [0, 240], [1840, 240], [1840, -240]]);
					}
				}
			}
			color(c = [0.3000000000, 0.3000000000, 1]) {
				translate(v = [0, 0, 2616.1000000000]) {
					linear_extrude(height = 360.0000000000) {
						polygon(paths = [[0, 1, 2, 3, 4, 5, 6, 7, 8, 9, 10, 11]], points = [[540, 2080], [540, 2140], [70, 2140], [70, 2340], [1770, 2340], [1770, 2140], [1730, 2140], [1730, 2080], [1440, 2080], [1440, 2140], [830, 2140], [830, 2080]]);
					}
				}
			}
			color(c = [0.3000000000, 0.3000000000, 1]) {
				translate(v = [0, 0, 2616.1000000000]) {
					linear_extrude(height = 360.0000000000) {
						polygon(paths = [[0, 1, 2, 3]], points = [[0, 2480], [0, 2960], [1840, 2960], [1840, 2480]]);
					}
				}
			}
		}
	}
}
